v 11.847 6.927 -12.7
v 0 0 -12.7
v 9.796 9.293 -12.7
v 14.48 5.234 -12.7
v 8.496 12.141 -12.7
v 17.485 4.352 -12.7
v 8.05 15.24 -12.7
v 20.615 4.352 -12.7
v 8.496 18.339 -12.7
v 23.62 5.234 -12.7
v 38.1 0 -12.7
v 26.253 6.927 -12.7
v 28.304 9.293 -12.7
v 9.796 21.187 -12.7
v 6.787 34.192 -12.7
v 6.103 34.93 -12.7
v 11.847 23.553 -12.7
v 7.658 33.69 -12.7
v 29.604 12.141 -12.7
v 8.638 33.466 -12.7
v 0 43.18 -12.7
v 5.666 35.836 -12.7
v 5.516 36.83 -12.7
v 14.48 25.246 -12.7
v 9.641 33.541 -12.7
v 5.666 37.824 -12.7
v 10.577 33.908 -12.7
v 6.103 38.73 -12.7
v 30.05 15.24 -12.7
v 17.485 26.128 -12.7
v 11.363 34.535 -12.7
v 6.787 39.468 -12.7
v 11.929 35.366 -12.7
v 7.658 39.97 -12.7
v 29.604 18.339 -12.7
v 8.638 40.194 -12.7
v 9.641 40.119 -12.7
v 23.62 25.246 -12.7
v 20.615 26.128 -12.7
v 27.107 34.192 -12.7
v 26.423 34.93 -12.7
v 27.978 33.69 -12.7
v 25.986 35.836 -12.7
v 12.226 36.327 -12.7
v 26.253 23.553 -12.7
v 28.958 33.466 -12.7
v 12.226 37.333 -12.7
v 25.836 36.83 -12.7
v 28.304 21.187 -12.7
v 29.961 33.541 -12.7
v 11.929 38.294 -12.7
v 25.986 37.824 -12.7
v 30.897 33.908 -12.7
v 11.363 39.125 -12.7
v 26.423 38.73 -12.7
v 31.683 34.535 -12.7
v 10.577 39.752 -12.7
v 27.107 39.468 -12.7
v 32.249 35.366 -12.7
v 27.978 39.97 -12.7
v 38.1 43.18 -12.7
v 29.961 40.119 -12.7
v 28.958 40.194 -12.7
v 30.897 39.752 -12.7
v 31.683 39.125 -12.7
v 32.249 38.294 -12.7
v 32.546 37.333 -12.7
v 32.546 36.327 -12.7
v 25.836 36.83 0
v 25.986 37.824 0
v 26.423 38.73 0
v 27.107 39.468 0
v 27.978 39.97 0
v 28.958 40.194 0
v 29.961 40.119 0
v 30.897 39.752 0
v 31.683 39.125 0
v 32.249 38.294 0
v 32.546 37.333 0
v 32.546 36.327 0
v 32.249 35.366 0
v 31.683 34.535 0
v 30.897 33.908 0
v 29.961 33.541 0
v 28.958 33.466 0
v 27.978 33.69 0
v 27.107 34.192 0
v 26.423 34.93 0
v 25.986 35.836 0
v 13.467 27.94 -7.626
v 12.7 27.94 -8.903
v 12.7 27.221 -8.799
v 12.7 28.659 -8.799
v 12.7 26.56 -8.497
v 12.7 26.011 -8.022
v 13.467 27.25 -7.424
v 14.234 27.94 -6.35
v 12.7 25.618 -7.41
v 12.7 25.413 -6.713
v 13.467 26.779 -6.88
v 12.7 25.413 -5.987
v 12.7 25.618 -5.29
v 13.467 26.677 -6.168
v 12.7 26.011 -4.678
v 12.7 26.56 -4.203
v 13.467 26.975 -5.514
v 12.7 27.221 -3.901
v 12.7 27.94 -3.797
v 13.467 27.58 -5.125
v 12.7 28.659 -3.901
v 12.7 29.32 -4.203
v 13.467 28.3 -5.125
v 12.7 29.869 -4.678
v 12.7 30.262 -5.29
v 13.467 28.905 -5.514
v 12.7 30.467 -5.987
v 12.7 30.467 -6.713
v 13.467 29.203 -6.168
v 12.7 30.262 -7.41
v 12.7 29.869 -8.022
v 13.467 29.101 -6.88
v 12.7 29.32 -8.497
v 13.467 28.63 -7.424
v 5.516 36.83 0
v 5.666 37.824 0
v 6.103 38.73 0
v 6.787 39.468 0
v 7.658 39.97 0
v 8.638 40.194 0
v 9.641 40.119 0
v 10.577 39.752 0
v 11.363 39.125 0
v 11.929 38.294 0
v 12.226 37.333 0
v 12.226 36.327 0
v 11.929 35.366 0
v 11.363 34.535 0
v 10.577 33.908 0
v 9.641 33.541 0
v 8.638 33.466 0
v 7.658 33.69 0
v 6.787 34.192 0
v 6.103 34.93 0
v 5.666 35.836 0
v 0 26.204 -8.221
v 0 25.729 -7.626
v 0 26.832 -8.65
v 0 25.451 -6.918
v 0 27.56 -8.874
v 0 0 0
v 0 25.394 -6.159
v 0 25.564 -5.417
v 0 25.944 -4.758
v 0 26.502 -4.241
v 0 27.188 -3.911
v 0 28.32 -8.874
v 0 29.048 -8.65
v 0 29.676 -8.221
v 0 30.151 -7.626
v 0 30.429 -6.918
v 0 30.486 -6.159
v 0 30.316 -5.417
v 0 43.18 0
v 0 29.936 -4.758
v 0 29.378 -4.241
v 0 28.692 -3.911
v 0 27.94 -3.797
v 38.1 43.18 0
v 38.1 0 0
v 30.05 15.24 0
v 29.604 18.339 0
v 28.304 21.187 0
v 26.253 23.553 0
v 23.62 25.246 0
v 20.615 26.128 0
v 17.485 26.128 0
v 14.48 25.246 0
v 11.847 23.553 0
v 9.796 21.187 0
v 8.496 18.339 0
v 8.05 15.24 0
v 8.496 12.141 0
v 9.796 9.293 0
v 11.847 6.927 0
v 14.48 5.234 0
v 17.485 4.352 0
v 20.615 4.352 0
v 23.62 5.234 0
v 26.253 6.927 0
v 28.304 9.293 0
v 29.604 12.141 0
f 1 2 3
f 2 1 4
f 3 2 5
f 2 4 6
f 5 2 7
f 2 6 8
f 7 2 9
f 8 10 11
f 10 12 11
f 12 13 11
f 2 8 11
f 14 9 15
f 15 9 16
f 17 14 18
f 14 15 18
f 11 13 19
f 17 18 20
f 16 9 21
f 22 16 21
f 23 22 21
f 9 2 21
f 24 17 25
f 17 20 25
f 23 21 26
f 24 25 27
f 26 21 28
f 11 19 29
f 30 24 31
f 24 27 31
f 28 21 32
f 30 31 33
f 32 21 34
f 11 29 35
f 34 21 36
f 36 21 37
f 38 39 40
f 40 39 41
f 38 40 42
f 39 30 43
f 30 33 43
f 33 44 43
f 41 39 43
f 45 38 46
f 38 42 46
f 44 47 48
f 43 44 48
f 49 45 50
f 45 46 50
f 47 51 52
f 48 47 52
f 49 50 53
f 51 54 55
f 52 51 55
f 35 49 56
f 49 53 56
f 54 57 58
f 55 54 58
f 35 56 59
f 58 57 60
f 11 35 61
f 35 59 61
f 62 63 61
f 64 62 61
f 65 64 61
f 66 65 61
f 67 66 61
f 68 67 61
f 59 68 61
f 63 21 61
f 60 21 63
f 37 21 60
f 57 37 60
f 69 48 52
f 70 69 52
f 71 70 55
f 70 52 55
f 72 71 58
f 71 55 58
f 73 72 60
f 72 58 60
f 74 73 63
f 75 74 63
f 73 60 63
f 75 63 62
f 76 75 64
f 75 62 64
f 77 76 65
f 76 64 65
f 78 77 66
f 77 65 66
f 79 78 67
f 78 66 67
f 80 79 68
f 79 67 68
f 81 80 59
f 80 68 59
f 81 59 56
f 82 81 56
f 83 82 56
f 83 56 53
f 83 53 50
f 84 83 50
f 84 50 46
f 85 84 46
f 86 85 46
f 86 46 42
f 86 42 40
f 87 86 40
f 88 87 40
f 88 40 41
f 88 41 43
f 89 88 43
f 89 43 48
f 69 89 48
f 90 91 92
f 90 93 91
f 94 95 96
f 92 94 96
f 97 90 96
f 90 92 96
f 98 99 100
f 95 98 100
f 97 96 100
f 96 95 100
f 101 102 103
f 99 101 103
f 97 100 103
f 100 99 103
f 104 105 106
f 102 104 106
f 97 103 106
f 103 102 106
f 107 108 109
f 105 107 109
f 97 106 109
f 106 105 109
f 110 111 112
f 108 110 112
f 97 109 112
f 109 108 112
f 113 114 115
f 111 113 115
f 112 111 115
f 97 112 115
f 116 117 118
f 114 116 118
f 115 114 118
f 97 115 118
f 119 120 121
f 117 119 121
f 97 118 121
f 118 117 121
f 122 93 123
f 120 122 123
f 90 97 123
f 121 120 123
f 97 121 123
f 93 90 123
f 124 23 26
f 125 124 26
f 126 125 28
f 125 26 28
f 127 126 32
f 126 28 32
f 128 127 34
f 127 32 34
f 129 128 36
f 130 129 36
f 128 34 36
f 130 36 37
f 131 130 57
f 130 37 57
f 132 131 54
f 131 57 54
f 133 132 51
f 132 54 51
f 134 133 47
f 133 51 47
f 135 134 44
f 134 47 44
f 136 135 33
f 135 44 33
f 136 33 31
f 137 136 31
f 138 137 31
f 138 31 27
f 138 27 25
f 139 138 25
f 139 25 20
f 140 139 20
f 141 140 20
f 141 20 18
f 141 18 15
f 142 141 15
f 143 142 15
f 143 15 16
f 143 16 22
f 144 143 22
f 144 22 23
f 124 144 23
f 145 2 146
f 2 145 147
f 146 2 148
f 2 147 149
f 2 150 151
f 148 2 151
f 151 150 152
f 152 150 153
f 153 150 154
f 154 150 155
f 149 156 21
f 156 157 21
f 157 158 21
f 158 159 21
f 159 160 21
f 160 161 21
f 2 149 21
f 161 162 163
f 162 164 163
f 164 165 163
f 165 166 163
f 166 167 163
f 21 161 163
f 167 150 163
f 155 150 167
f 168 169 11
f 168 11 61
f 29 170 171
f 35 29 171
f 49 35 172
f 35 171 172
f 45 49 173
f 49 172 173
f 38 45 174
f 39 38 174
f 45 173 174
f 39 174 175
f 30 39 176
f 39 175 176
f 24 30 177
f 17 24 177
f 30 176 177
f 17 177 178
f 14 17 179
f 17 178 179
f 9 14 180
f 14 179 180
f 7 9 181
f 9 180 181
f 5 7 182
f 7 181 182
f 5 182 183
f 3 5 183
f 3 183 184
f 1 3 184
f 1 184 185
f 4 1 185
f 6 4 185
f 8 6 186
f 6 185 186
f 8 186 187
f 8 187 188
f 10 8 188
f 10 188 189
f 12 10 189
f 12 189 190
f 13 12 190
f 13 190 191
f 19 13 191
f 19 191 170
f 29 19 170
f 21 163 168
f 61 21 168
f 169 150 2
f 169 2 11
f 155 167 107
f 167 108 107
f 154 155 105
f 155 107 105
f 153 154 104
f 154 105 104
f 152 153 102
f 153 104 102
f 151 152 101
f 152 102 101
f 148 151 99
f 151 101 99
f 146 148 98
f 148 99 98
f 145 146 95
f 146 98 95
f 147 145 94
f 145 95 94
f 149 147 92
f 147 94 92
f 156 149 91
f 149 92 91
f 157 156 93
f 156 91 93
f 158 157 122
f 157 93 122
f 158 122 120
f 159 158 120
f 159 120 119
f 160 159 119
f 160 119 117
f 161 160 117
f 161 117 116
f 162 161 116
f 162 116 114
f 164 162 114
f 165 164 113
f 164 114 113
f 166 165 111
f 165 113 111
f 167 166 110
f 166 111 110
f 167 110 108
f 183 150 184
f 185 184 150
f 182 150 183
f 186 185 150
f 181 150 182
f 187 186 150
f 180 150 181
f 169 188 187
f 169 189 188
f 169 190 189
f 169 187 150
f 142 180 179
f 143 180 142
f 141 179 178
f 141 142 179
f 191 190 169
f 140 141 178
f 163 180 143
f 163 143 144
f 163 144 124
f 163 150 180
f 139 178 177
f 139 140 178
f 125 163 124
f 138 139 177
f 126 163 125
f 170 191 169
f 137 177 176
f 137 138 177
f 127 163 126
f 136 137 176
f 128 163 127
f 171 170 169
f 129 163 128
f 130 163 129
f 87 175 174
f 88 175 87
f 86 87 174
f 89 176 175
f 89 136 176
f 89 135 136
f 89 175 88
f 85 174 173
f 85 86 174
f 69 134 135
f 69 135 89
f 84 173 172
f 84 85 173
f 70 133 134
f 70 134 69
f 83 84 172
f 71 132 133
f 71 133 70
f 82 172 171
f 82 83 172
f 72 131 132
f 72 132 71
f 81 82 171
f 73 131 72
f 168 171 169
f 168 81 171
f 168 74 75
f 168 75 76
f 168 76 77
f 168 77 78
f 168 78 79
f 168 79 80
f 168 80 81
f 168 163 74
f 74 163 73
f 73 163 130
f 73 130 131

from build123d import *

# Parameters (mm, degrees)
SKETCH1_W                        = 38.1
SKETCH1_H                        = 43.18
BOSS_EXTRUDE1_DEPTH              = 12.7
SKETCH3_R                        = 11
CUT_EXTRUDE1_DEPTH               = 13.7
F_17_64_0_26563_DIAMETER_HOLE1_D = 6.747002
F_1_4_20_TAPPED_HOLE2_D          = 5.1054
F_1_4_20_TAPPED_HOLE2_DEPTH      = 12.7
F_1_4_20_TAPPED_HOLE2_TIP        = 1.533816902


with BuildPart() as part:
    # Sketch1 → Boss-Extrude1 (new body)
    with BuildSketch(Plane.XY):
        with Locations((19.05, 21.59)):
            Rectangle(SKETCH1_W, SKETCH1_H)
    extrude(amount=-BOSS_EXTRUDE1_DEPTH)

    # Sketch3 → Cut-Extrude1 (cut, through all)
    with BuildSketch(Plane.XY):
        with Locations((19.05, 15.24)):
            Circle(SKETCH3_R)
    extrude(amount=-CUT_EXTRUDE1_DEPTH, mode=Mode.SUBTRACT)

    # 17/64 (0.26563) Diameter Hole1 (through all)
    with Locations(Plane(origin=(29.21, 36.83, 0), x_dir=(1, 0, 0), z_dir=(0, 0, 1))):
        with Locations((0, 0), (-20.32, 0)):
            Hole(F_17_64_0_26563_DIAMETER_HOLE1_D / 2)

    # 1/4-20 Tapped Hole2
    with Locations(Plane(origin=(0, 27.94, -6.35), x_dir=(0, 0, -1), z_dir=(-1, 0, 0))):
        with Locations((0, 0)):
            Hole(F_1_4_20_TAPPED_HOLE2_D / 2, depth=F_1_4_20_TAPPED_HOLE2_DEPTH)
            with Locations((0, 0, -(F_1_4_20_TAPPED_HOLE2_DEPTH + F_1_4_20_TAPPED_HOLE2_TIP / 2))):  # 118° drill point
                Cone(0, F_1_4_20_TAPPED_HOLE2_D / 2, F_1_4_20_TAPPED_HOLE2_TIP, mode=Mode.SUBTRACT)


solid = part.part
